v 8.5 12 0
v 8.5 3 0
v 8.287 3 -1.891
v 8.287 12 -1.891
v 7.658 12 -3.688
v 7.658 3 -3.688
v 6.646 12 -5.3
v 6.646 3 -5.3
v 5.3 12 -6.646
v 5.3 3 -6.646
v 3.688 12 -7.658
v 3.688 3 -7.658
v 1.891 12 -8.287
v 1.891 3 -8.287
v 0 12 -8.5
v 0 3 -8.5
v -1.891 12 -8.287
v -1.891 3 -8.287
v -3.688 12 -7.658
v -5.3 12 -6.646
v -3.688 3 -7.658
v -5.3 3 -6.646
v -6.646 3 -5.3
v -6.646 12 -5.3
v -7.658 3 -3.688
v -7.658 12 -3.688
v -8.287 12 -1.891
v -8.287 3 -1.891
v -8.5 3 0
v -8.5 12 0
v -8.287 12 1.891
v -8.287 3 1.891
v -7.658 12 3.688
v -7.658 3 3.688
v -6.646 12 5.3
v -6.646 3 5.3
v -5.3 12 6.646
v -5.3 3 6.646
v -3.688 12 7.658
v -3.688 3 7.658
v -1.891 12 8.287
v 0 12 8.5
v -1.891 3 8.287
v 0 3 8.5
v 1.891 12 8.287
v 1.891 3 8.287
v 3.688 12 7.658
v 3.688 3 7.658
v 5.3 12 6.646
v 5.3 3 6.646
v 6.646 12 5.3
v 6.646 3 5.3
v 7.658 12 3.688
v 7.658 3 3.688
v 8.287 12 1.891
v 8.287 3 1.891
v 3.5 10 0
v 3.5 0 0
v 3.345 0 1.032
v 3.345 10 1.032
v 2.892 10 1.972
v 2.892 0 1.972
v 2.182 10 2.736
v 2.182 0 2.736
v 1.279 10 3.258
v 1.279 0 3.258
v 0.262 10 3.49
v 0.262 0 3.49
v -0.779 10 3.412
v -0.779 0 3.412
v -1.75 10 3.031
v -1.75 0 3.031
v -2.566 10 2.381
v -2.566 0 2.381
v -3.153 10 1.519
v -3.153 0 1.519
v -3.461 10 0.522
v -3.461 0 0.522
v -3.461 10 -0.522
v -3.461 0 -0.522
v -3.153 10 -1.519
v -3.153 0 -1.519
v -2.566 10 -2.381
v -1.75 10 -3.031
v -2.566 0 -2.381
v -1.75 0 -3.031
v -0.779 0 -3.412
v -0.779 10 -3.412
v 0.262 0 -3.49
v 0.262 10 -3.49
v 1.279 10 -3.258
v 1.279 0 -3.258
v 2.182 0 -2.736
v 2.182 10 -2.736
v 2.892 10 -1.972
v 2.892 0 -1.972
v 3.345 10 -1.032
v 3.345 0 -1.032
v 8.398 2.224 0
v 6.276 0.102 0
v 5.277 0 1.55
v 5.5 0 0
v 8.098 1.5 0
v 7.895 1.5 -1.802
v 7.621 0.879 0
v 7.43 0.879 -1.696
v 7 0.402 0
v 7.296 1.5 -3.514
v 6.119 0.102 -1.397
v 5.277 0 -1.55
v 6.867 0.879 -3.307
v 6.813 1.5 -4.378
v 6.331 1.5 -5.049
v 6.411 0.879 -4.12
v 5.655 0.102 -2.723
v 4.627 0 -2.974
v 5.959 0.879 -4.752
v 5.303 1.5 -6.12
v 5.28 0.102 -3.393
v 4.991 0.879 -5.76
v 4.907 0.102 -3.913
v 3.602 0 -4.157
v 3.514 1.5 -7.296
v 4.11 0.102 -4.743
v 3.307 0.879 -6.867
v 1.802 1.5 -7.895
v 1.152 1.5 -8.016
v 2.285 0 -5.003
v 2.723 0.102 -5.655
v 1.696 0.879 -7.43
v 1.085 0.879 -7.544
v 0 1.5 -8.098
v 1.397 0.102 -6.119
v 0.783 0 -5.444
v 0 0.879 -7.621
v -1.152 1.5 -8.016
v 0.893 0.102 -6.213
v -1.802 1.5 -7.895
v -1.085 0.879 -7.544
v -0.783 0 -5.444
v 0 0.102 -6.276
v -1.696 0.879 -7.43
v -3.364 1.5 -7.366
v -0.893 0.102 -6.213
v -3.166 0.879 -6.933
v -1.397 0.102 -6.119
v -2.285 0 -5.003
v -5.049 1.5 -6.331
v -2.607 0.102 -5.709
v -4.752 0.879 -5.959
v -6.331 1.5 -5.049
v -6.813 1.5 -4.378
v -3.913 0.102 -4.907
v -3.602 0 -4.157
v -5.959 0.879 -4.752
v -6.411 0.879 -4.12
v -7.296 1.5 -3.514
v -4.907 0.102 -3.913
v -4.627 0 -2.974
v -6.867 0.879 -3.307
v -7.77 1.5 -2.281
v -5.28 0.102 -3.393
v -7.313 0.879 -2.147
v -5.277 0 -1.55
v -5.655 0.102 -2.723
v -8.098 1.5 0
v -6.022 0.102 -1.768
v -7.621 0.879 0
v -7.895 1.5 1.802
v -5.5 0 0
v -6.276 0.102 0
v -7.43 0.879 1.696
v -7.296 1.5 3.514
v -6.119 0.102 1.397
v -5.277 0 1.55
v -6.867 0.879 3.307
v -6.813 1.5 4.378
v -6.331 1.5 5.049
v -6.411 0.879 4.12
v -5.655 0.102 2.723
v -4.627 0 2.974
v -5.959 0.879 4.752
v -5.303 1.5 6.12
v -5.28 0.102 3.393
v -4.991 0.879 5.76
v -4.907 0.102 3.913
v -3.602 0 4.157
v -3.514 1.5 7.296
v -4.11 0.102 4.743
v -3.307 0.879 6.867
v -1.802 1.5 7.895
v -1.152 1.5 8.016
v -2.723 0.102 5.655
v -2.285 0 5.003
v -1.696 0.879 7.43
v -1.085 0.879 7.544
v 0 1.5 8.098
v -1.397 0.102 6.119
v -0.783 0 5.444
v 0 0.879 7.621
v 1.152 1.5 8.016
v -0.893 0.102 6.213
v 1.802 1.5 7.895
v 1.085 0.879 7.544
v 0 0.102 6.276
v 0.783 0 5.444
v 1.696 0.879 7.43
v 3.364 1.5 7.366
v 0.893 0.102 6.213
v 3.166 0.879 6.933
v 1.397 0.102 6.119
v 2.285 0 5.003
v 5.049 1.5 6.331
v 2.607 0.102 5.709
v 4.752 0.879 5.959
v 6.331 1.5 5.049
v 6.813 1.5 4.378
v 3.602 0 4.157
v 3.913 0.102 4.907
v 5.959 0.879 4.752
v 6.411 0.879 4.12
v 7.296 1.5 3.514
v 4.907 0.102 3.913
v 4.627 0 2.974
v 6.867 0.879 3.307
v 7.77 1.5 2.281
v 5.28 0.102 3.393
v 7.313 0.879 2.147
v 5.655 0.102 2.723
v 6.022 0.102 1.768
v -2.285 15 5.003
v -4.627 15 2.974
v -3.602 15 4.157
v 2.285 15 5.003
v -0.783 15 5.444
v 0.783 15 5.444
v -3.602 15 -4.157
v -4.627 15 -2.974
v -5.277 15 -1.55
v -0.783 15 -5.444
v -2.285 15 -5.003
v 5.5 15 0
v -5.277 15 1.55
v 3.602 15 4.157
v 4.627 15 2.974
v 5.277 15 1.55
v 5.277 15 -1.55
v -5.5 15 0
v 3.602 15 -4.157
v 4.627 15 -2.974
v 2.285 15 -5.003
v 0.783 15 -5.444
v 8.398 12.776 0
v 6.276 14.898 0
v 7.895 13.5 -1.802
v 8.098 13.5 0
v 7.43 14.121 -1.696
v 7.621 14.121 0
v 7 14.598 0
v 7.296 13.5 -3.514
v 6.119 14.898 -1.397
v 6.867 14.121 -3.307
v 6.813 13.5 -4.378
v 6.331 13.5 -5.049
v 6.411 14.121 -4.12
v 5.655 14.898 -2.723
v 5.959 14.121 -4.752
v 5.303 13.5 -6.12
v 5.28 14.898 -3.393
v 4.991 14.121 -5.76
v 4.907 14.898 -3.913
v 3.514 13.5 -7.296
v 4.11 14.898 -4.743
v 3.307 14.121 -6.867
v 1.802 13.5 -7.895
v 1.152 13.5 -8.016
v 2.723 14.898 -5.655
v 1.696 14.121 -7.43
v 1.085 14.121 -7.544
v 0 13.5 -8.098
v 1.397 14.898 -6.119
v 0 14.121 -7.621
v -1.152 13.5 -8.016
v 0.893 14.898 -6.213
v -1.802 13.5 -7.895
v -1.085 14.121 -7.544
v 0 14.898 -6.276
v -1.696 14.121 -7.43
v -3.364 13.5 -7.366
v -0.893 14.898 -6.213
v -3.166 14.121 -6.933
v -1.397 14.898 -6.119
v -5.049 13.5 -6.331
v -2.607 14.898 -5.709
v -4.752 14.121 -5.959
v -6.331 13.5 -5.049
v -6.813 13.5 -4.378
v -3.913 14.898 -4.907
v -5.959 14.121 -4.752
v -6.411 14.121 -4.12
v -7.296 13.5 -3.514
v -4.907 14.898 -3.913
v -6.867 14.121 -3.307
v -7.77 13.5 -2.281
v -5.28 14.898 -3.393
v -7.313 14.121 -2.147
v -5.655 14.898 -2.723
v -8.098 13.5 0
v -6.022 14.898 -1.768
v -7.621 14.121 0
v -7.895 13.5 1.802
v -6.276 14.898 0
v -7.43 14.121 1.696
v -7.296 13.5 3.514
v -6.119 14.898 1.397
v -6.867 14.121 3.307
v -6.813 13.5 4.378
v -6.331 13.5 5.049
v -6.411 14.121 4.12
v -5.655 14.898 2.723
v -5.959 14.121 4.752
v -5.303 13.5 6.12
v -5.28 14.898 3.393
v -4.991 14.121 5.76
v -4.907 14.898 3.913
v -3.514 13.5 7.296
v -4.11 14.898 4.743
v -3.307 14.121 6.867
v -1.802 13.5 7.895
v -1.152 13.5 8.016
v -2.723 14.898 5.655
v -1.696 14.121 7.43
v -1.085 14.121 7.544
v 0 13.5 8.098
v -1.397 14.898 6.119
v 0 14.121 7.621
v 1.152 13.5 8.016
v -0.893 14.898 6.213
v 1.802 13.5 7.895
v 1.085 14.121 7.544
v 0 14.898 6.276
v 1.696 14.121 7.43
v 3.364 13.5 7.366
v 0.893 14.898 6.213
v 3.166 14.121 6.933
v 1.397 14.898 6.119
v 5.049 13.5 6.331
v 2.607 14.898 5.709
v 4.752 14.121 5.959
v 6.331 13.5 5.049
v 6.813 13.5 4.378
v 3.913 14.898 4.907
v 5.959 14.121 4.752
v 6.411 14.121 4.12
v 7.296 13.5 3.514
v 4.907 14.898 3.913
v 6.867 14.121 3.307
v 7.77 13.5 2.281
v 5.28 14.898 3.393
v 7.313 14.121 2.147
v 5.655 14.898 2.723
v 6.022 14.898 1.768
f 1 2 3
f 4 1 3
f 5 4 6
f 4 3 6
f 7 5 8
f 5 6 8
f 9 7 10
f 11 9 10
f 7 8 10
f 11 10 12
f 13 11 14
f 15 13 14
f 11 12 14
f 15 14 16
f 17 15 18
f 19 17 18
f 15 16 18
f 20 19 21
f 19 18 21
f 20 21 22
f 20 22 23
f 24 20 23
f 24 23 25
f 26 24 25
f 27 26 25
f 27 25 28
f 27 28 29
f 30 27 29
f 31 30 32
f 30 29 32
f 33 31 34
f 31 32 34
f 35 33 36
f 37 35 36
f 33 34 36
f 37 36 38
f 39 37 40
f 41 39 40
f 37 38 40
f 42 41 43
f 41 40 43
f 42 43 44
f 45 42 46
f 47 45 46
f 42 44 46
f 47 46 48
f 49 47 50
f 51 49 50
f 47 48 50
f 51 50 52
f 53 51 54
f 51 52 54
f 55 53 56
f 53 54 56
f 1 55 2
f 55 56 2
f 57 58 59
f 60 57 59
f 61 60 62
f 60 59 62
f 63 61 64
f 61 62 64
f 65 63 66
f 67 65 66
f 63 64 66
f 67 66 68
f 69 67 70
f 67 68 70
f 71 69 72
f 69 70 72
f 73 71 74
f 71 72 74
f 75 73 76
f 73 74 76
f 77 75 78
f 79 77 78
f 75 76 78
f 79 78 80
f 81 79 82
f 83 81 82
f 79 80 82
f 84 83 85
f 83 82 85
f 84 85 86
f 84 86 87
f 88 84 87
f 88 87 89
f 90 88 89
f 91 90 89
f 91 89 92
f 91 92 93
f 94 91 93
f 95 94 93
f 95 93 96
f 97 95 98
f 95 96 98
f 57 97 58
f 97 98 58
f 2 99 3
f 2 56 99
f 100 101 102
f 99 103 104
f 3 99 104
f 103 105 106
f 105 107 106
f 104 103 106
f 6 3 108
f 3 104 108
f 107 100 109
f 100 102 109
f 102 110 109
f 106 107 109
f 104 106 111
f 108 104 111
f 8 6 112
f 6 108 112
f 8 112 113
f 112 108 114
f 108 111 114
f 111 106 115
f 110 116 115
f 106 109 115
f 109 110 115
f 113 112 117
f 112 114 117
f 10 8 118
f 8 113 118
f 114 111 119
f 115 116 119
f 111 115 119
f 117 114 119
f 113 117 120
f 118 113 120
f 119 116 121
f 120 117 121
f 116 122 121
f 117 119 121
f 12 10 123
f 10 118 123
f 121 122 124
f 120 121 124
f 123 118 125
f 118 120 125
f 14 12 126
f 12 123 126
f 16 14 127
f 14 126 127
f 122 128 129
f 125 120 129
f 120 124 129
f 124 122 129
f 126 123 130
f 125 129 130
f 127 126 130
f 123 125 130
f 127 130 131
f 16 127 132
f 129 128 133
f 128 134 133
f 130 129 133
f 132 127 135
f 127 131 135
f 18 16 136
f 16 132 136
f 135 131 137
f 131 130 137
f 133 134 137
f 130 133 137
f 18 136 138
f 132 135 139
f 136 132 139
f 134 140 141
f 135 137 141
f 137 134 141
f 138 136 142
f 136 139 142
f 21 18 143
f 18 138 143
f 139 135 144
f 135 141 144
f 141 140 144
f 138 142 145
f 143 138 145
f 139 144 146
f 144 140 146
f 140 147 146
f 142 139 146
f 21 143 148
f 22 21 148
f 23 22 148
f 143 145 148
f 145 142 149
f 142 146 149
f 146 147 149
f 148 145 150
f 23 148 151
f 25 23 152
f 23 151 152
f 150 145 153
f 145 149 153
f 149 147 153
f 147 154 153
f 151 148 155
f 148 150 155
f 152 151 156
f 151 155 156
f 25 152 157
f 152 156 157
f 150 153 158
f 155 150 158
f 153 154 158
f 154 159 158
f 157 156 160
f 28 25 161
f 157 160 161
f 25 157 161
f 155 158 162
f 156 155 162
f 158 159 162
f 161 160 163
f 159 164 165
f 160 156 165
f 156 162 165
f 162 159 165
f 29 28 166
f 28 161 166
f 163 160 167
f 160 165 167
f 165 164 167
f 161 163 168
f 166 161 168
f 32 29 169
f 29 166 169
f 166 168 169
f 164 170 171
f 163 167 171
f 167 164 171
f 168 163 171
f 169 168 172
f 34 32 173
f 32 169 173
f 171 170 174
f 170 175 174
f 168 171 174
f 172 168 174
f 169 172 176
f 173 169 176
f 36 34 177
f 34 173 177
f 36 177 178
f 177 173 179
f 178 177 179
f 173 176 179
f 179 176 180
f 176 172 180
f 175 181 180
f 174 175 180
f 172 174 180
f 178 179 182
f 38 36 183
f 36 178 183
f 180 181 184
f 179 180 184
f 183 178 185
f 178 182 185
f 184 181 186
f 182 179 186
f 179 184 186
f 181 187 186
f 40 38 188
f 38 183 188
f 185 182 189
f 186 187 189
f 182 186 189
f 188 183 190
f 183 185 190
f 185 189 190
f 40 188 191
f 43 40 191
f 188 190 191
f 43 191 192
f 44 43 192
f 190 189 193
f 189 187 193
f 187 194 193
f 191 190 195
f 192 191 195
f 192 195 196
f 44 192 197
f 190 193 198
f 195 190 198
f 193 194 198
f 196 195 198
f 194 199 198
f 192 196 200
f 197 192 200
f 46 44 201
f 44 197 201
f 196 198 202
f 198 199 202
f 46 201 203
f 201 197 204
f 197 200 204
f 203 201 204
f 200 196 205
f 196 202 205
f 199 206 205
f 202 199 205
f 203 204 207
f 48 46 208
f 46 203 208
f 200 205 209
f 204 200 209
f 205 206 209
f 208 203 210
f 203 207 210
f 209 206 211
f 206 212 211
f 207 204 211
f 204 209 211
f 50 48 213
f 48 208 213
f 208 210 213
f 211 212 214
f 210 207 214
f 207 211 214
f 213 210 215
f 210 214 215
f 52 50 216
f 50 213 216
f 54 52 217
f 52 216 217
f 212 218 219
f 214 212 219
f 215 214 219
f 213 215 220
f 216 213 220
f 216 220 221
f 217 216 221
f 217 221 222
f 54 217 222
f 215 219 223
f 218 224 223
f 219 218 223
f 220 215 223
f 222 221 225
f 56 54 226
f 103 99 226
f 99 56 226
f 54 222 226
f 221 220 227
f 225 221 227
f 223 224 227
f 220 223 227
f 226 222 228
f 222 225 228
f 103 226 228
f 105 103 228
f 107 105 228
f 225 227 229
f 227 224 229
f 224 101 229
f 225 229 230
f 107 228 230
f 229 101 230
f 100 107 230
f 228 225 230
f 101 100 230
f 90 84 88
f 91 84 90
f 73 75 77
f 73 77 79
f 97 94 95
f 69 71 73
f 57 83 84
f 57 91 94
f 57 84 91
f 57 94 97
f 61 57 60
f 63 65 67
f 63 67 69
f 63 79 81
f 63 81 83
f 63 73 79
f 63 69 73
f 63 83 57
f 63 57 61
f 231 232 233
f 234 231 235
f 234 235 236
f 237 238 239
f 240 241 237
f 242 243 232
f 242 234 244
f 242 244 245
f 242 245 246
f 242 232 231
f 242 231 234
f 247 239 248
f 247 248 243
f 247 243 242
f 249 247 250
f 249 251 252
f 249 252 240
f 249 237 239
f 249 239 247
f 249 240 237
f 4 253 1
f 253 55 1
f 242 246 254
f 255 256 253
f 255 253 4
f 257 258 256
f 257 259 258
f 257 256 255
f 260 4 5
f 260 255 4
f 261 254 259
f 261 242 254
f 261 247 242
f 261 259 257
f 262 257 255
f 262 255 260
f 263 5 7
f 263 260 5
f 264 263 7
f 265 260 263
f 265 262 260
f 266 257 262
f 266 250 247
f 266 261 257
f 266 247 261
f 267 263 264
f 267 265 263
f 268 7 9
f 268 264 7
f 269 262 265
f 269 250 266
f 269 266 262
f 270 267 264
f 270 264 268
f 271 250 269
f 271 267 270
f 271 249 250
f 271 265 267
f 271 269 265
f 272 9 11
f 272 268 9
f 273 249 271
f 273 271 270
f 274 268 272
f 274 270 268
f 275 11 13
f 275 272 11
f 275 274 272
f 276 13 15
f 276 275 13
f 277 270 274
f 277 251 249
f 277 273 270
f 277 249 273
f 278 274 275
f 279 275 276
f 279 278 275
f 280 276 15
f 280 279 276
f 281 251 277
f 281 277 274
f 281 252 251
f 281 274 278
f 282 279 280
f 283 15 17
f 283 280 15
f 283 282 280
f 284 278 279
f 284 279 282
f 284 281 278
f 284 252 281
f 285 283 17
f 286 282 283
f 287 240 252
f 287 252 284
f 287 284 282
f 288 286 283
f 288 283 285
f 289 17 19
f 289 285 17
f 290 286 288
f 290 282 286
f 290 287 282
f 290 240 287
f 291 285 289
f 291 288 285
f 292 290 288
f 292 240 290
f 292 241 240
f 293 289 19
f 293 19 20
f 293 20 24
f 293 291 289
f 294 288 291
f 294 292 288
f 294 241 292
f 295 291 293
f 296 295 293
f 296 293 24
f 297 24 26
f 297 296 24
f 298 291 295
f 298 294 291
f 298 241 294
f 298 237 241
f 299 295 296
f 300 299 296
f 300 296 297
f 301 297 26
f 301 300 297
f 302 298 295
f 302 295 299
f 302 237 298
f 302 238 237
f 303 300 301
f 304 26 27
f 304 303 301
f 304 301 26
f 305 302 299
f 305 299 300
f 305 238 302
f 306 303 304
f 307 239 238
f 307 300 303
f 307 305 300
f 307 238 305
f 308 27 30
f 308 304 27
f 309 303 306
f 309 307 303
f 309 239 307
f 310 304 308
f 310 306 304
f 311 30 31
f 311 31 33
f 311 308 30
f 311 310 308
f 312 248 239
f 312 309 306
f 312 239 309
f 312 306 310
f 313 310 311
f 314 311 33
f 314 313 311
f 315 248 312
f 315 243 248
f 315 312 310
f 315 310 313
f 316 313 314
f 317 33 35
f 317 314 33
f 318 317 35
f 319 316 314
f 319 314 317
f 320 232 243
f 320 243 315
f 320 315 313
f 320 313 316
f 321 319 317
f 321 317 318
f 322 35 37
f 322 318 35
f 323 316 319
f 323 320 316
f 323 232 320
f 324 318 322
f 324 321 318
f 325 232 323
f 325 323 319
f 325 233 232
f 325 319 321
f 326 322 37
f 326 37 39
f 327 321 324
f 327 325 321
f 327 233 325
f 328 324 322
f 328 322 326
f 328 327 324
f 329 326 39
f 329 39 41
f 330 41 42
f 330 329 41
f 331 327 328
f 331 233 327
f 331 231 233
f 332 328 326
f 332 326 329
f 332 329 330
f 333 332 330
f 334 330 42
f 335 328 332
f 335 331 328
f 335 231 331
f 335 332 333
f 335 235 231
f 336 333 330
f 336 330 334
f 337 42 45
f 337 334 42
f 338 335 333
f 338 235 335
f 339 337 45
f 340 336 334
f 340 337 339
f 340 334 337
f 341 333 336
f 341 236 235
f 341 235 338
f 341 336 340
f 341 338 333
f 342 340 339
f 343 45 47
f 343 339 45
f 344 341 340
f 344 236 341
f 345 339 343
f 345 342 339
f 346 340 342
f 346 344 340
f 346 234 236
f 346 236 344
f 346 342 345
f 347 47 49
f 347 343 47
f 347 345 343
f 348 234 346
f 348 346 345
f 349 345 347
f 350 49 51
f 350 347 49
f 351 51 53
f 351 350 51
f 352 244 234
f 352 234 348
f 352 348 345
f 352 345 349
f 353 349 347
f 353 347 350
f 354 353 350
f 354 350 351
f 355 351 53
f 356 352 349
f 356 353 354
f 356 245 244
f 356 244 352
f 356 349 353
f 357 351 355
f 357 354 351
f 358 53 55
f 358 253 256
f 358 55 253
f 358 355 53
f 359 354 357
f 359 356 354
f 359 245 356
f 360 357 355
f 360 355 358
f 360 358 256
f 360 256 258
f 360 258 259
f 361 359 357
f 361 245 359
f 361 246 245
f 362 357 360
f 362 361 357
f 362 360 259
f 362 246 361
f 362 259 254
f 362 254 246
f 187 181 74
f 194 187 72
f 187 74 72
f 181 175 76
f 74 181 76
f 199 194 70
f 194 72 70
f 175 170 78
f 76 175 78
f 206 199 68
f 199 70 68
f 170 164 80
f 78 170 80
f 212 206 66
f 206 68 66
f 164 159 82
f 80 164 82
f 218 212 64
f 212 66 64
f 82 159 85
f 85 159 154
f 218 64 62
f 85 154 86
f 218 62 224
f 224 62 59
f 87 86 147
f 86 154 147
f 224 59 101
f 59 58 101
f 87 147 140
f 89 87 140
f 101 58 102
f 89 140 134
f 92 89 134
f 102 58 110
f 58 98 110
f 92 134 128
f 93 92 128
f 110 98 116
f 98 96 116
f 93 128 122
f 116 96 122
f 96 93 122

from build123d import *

# Parameters (mm, degrees)
SKETCH_1_R          = 8.5
EXTRUDE_1_DEPTH     = 15
SKETCH_2_R          = 3.5
CUT_EXTRUDE_1_DEPTH = 10
FILLET_1_R          = 3


with BuildPart() as part:
    # Эскиз1 → Бобышка-Вытянуть1 (new body)
    with BuildSketch(Plane(origin=(0, 0, 0), x_dir=(1, 0, 0), z_dir=(0, 1, 0))):
        Circle(SKETCH_1_R)
    extrude(amount=EXTRUDE_1_DEPTH)

    # Эскиз2 → Вырез-Вытянуть1 (cut)
    with BuildSketch(Plane.XZ):
        Circle(SKETCH_2_R)
    extrude(amount=-CUT_EXTRUDE_1_DEPTH, mode=Mode.SUBTRACT)

    # Скругление1
    fillet_1_edges = [part.edges().sort_by_distance(p)[0] for p in [
        (-8.5, 0, 0),
        (-8.5, 15, 0),
    ]]
    fillet(fillet_1_edges, radius=FILLET_1_R)


solid = part.part
